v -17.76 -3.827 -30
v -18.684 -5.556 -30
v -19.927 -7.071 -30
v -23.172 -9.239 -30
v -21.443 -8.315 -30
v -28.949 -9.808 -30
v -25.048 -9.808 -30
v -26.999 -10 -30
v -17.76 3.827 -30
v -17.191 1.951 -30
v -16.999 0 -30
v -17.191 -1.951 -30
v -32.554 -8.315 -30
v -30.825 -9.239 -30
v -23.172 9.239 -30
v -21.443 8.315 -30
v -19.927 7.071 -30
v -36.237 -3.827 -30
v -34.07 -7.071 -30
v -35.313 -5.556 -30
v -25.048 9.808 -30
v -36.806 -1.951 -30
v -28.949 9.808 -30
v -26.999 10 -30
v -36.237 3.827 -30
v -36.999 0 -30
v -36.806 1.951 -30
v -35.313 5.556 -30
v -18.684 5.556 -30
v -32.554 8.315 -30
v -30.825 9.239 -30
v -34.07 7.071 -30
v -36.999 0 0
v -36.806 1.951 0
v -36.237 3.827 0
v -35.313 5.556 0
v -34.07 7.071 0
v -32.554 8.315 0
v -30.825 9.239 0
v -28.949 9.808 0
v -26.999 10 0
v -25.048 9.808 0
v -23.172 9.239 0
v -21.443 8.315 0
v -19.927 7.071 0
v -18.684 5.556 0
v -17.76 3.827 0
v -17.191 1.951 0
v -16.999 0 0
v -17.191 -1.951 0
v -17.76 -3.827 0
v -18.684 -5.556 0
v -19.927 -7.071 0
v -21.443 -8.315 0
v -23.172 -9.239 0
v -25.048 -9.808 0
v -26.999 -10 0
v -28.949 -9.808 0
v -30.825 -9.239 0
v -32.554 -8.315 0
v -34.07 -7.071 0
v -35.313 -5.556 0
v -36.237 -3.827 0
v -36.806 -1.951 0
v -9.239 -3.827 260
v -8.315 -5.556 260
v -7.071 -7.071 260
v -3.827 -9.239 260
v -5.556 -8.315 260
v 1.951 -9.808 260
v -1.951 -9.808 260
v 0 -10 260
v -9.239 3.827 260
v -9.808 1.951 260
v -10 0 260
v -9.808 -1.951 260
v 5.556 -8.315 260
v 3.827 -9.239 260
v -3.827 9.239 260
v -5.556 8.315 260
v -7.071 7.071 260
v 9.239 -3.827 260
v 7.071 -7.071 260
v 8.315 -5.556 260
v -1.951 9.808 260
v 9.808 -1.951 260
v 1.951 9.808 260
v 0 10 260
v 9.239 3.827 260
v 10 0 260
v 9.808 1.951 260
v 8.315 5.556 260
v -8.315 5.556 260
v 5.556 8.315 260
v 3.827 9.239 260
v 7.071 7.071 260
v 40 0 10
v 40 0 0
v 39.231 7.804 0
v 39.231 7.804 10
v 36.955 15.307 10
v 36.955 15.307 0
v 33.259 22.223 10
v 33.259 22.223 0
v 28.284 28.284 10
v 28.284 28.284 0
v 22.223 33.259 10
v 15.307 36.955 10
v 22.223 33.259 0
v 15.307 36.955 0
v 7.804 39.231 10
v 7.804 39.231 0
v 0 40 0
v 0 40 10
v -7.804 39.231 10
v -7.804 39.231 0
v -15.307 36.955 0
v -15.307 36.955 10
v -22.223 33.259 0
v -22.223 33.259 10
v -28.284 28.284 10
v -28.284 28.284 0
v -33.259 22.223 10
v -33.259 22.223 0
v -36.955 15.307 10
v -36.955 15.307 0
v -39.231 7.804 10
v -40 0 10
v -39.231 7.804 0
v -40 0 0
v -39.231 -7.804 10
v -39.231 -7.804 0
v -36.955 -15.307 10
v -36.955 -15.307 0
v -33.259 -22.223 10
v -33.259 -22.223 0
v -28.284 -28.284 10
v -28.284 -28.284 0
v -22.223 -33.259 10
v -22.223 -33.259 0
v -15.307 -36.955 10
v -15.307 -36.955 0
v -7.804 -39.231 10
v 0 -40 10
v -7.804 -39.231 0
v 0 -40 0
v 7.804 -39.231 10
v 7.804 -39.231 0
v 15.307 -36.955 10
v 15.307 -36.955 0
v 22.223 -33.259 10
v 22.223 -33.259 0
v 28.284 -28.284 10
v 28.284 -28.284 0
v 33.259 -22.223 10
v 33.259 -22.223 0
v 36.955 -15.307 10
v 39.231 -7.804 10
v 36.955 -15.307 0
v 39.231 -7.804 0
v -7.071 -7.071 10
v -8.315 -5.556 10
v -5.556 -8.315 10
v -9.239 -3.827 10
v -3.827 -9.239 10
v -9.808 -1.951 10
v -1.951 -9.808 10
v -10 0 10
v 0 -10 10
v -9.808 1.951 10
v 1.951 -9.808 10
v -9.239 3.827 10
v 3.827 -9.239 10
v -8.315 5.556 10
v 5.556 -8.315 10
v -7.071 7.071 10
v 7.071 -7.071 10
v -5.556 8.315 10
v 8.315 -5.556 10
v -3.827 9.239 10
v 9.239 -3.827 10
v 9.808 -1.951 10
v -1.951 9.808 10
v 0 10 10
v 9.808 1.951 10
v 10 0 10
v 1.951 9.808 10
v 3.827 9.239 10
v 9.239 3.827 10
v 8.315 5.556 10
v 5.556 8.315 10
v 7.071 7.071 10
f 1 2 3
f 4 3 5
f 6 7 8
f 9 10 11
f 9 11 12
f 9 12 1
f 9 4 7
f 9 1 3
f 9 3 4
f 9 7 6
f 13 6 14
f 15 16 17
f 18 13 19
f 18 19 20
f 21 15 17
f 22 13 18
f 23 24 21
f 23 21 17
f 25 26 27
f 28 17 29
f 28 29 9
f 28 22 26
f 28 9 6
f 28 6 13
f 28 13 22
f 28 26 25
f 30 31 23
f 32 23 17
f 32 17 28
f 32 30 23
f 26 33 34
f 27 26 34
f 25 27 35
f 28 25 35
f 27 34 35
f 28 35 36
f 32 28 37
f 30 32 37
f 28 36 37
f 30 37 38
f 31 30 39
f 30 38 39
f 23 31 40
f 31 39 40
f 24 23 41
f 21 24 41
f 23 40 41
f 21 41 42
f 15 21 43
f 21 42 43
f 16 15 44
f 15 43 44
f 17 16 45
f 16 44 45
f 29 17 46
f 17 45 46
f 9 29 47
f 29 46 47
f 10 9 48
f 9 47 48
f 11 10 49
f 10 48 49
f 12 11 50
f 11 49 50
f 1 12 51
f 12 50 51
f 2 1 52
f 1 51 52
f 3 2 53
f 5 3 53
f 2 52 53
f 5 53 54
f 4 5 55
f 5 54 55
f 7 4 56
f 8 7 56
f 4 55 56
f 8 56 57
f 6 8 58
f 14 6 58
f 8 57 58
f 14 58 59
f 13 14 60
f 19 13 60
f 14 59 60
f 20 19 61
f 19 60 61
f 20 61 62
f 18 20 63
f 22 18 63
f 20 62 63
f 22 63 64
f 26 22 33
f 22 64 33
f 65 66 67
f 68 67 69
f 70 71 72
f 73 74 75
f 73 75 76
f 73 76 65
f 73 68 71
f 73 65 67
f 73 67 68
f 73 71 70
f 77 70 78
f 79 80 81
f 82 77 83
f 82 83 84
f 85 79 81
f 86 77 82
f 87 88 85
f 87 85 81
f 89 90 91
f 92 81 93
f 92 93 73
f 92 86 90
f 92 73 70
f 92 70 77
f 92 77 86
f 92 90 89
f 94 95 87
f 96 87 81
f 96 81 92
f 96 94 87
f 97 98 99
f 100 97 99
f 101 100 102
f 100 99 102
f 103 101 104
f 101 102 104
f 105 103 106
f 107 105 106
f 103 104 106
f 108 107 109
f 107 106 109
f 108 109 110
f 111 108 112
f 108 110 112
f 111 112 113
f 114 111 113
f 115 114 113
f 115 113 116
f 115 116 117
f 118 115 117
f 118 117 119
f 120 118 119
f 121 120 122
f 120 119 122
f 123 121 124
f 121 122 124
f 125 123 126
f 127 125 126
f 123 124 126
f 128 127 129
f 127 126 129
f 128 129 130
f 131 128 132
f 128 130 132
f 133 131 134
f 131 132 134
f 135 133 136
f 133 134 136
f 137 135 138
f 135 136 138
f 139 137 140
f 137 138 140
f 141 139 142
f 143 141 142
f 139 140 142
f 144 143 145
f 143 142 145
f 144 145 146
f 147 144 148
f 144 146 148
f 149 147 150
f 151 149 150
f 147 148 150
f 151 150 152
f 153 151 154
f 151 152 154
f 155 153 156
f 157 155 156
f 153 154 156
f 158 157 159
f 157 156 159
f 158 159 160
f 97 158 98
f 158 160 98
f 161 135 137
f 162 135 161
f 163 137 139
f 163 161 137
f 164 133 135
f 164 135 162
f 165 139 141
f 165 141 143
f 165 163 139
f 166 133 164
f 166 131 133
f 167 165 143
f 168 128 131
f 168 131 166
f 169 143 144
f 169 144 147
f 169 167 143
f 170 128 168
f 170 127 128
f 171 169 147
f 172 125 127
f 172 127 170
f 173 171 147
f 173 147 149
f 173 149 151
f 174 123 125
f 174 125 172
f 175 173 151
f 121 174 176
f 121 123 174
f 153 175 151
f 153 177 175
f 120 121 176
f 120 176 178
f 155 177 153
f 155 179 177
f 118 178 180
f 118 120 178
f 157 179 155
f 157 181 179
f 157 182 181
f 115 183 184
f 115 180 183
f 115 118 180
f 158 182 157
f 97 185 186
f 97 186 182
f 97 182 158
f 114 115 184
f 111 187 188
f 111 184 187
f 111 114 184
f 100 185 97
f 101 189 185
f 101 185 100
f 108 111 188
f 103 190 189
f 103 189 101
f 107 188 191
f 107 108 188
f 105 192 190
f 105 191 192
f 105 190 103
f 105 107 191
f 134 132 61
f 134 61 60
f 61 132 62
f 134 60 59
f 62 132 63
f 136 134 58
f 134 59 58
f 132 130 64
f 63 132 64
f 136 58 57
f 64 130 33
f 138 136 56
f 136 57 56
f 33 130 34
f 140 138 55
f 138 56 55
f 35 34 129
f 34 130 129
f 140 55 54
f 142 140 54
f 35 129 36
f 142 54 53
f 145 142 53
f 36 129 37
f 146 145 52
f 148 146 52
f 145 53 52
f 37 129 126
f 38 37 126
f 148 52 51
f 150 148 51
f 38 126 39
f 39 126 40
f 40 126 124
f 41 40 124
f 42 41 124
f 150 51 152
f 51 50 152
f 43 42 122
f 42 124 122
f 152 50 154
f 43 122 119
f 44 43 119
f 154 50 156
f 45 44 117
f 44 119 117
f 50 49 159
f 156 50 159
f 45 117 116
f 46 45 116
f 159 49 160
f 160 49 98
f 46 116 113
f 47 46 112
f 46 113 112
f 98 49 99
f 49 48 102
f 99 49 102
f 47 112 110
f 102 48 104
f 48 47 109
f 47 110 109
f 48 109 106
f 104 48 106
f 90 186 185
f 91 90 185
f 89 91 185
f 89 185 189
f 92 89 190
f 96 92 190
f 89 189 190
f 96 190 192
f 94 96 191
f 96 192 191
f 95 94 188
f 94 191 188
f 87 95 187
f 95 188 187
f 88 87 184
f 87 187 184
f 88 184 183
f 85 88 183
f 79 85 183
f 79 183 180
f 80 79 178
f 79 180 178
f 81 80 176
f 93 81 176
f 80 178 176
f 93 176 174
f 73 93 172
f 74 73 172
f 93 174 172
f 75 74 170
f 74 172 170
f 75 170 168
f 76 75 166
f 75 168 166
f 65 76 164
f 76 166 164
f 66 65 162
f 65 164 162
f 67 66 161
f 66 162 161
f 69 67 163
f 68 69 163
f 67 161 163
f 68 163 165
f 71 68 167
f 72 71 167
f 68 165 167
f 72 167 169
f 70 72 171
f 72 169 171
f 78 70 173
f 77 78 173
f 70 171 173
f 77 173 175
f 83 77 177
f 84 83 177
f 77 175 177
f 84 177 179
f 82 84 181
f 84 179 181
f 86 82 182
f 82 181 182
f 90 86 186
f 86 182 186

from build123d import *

# Parameters (mm, degrees)
SKETCH1_R           = 40
BOSS_EXTRUDE1_DEPTH = 10
SKETCH2_R           = 10
BOSS_EXTRUDE2_DEPTH = 250
SKETCH3_R           = 10
BOSS_EXTRUDE3_DEPTH = 30


with BuildPart() as part:
    # Sketch1 → Boss-Extrude1 (new body)
    with BuildSketch(Plane.XY):
        Circle(SKETCH1_R)
    extrude(amount=BOSS_EXTRUDE1_DEPTH)

    # Sketch2 → Boss-Extrude2 (add)
    with BuildSketch(Plane.XY.offset(10)):
        Circle(SKETCH2_R)
    extrude(amount=BOSS_EXTRUDE2_DEPTH)

    # Sketch3 → Boss-Extrude3 (add)
    with BuildSketch(Plane(origin=(0, 0, 0), x_dir=(-1, 0, 0), z_dir=(0, 0, -1))):
        with Locations((26.998561916, 0)):
            Circle(SKETCH3_R)
    extrude(amount=BOSS_EXTRUDE3_DEPTH)


solid = part.part
